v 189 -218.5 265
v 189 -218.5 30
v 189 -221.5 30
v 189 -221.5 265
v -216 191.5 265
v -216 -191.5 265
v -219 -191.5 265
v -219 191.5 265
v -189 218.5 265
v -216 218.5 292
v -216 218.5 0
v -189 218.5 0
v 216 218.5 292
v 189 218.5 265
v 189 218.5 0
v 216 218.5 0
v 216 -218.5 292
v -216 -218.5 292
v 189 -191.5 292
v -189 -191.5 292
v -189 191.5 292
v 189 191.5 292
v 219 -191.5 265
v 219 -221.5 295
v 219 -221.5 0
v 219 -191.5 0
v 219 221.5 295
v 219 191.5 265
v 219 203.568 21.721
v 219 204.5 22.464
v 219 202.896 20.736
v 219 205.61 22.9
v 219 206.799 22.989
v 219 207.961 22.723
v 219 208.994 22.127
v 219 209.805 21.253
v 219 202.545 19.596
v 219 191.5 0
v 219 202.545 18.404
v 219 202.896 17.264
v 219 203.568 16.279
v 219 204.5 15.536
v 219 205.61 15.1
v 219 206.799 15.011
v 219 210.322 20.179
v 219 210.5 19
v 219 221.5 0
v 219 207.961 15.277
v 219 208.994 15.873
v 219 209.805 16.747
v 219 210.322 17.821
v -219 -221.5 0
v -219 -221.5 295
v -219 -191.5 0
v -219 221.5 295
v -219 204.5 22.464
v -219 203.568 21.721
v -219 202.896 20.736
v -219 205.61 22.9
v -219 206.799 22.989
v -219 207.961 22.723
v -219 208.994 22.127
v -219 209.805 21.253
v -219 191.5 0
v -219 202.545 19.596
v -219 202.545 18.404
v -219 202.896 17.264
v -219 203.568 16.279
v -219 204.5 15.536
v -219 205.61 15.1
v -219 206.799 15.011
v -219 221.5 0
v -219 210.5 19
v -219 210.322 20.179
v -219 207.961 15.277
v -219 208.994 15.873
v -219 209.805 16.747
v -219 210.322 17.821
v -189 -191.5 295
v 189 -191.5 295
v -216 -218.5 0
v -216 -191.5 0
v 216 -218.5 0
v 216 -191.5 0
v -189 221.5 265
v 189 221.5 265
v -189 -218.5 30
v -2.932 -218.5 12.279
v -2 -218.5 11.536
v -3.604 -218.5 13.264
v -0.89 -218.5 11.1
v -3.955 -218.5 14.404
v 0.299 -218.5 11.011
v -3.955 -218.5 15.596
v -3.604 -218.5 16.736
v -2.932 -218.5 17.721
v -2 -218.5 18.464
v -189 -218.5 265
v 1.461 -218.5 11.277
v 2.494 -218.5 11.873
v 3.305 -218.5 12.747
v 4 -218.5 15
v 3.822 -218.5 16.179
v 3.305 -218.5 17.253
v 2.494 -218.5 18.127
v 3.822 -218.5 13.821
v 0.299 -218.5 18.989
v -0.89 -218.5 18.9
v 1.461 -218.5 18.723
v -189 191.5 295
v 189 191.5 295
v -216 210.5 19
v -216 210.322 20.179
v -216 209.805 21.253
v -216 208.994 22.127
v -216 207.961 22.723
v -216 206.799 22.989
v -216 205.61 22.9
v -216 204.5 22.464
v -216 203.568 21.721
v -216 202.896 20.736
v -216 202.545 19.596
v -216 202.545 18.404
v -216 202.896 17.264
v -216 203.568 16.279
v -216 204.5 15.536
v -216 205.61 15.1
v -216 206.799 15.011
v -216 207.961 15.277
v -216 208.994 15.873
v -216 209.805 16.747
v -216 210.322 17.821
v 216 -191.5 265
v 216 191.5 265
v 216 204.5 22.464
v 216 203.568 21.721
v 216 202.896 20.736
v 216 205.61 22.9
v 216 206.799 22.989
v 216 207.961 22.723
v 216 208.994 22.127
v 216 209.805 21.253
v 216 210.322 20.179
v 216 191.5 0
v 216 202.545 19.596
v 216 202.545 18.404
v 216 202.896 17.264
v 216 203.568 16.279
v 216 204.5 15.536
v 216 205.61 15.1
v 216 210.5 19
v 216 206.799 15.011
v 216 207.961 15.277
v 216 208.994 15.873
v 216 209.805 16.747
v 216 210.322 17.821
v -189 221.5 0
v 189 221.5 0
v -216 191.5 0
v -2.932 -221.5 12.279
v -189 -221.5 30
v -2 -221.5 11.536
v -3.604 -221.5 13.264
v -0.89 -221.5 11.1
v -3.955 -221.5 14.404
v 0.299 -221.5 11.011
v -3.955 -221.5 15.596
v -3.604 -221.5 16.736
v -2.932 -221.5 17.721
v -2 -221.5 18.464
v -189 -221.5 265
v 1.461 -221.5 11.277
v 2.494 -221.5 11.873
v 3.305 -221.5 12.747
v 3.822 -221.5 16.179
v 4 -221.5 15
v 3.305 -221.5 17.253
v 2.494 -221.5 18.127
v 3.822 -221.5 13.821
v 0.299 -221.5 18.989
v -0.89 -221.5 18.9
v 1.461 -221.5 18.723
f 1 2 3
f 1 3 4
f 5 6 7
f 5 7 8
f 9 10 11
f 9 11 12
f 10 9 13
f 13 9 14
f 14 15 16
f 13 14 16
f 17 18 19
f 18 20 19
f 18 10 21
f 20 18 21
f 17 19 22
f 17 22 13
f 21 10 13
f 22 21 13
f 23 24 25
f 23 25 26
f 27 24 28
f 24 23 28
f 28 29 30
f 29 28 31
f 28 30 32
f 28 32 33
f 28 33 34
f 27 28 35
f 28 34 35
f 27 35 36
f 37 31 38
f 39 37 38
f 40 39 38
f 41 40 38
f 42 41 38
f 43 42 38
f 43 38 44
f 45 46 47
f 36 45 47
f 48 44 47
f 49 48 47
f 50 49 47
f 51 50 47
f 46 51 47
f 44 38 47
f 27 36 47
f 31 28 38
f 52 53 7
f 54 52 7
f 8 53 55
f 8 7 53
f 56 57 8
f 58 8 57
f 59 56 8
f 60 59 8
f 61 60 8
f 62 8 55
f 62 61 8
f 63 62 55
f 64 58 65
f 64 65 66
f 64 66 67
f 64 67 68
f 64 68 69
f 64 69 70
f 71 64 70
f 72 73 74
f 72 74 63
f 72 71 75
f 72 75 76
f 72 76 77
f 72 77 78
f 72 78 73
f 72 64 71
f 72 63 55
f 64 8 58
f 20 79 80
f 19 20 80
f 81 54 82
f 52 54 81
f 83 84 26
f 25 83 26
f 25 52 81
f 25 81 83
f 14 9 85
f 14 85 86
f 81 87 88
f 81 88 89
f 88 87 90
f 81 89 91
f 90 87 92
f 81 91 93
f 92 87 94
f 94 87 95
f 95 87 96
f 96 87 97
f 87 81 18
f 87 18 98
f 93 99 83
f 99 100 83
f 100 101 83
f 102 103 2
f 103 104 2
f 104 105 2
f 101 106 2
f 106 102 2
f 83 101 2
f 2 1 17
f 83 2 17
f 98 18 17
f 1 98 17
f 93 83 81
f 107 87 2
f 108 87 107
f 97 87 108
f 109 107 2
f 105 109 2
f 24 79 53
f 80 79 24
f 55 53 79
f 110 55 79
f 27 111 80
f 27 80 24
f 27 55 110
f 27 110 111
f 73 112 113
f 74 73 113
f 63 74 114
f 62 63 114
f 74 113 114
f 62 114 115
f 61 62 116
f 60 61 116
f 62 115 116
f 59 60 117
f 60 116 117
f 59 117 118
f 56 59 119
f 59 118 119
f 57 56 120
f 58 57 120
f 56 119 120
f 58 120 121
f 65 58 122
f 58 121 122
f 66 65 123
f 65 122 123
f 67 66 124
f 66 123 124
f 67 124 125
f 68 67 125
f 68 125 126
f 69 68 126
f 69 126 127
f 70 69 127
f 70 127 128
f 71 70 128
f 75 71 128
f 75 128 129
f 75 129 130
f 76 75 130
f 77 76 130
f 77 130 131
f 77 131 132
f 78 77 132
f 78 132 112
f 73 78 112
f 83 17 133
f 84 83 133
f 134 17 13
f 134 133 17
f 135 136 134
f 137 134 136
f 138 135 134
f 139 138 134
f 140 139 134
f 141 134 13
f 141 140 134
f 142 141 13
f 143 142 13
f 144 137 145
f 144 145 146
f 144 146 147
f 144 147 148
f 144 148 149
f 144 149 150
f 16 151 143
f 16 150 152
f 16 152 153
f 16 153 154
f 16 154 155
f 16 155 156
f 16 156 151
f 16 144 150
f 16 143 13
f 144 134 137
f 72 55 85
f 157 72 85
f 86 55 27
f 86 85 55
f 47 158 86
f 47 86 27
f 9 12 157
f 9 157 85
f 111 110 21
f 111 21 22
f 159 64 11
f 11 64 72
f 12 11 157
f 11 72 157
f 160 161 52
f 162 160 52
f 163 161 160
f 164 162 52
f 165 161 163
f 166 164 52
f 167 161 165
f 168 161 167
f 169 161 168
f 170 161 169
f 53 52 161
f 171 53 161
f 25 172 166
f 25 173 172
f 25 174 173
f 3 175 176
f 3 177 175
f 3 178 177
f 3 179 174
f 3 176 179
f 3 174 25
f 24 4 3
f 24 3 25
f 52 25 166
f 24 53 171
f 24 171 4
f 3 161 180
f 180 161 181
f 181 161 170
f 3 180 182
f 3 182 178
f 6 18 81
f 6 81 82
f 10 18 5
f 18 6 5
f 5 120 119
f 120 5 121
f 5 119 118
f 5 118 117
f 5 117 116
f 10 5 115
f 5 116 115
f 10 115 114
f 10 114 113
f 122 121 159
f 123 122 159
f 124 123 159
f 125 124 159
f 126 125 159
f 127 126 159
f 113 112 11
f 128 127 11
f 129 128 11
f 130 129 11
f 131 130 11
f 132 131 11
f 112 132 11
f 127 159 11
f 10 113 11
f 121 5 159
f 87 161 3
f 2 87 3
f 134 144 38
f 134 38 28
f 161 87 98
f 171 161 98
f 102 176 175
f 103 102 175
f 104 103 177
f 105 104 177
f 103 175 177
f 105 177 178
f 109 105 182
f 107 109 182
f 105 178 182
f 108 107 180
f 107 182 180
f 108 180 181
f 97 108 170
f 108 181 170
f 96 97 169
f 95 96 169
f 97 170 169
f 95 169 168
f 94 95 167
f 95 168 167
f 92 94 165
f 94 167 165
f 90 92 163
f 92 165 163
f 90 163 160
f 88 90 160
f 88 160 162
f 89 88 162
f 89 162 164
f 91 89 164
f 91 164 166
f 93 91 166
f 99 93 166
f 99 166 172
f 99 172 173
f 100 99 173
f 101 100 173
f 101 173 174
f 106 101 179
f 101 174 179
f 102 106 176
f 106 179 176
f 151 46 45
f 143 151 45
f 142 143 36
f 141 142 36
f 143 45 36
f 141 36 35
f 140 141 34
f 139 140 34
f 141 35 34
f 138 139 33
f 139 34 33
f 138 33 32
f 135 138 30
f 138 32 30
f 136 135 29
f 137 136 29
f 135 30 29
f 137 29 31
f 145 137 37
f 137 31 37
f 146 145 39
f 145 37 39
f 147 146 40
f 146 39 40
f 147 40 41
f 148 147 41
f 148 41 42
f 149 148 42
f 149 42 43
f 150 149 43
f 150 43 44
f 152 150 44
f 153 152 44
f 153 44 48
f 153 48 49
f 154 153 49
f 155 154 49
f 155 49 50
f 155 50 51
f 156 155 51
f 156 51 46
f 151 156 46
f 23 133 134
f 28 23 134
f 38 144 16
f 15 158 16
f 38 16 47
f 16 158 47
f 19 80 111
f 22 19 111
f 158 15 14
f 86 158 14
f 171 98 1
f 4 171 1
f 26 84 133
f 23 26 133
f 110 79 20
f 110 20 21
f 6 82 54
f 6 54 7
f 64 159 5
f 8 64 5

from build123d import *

# Parameters (mm, degrees)
F0_W          = 438
F0_H          = 443
F1_DEPTH      = 295
F2_T          = -3
F3_W          = 378
F3_H          = 265
F4_DEPTH      = 221.501
F4_DEPTH_BACK = 221.501
F5_W          = 383
F5_H          = 265
F6_DEPTH      = 219.001
F6_DEPTH_BACK = 219.001
F7_W          = 378
F7_H          = 383
F8_DEPTH      = 295.001
F9_W          = 378
F9_H          = 30
F9_R          = 4
F10_DEPTH     = 3
F11_R         = 4
F12_DEPTH     = 438.001


with BuildPart() as f1:
    # F0 (on Top) → F1 (new body)
    with BuildSketch(Plane.XY):
        Rectangle(F0_W, F0_H)
    extrude(amount=F1_DEPTH)

    # F2
    f2_openings = [f1.faces().sort_by_distance(p)[0] for p in [
        (0, 0, 0),
    ]]
    offset(amount=F2_T, openings=f2_openings)

    # F3 (on Front) → F4 (cut, two sides)
    with BuildSketch(Plane.XZ) as f4_sk:
        with Locations((0, 132.5)):
            Rectangle(F3_W, F3_H)
    extrude(amount=-F4_DEPTH, mode=Mode.SUBTRACT)
    extrude(f4_sk.sketch, amount=F4_DEPTH_BACK, mode=Mode.SUBTRACT)

    # F5 (on Right) → F6 (cut, two sides)
    with BuildSketch(Plane.YZ) as f6_sk:
        with Locations((0, 132.5)):
            Rectangle(F5_W, F5_H)
    extrude(amount=-F6_DEPTH, mode=Mode.SUBTRACT)
    extrude(f6_sk.sketch, amount=F6_DEPTH_BACK, mode=Mode.SUBTRACT)

    # F7 (on face) → F8 (cut, through all)
    with BuildSketch(Plane.XY.offset(295)):
        Rectangle(F7_W, F7_H)
    extrude(amount=-F8_DEPTH, mode=Mode.SUBTRACT)

    # F9 (on face) → F10 (join, through all)
    with BuildSketch(Plane.XZ.offset(221.5)):
        with Locations((0, 15)):
            Rectangle(F9_W, F9_H)
        with Locations((0, 15)):
            Circle(F9_R, mode=Mode.SUBTRACT)
    extrude(amount=-F10_DEPTH)

    # F11 (on face) → F12 (cut, through all)
    with BuildSketch(Plane.YZ.offset(219)):
        with Locations((206.5, 19)):
            Circle(F11_R)
    extrude(amount=-F12_DEPTH, mode=Mode.SUBTRACT)


solid = f1.part
